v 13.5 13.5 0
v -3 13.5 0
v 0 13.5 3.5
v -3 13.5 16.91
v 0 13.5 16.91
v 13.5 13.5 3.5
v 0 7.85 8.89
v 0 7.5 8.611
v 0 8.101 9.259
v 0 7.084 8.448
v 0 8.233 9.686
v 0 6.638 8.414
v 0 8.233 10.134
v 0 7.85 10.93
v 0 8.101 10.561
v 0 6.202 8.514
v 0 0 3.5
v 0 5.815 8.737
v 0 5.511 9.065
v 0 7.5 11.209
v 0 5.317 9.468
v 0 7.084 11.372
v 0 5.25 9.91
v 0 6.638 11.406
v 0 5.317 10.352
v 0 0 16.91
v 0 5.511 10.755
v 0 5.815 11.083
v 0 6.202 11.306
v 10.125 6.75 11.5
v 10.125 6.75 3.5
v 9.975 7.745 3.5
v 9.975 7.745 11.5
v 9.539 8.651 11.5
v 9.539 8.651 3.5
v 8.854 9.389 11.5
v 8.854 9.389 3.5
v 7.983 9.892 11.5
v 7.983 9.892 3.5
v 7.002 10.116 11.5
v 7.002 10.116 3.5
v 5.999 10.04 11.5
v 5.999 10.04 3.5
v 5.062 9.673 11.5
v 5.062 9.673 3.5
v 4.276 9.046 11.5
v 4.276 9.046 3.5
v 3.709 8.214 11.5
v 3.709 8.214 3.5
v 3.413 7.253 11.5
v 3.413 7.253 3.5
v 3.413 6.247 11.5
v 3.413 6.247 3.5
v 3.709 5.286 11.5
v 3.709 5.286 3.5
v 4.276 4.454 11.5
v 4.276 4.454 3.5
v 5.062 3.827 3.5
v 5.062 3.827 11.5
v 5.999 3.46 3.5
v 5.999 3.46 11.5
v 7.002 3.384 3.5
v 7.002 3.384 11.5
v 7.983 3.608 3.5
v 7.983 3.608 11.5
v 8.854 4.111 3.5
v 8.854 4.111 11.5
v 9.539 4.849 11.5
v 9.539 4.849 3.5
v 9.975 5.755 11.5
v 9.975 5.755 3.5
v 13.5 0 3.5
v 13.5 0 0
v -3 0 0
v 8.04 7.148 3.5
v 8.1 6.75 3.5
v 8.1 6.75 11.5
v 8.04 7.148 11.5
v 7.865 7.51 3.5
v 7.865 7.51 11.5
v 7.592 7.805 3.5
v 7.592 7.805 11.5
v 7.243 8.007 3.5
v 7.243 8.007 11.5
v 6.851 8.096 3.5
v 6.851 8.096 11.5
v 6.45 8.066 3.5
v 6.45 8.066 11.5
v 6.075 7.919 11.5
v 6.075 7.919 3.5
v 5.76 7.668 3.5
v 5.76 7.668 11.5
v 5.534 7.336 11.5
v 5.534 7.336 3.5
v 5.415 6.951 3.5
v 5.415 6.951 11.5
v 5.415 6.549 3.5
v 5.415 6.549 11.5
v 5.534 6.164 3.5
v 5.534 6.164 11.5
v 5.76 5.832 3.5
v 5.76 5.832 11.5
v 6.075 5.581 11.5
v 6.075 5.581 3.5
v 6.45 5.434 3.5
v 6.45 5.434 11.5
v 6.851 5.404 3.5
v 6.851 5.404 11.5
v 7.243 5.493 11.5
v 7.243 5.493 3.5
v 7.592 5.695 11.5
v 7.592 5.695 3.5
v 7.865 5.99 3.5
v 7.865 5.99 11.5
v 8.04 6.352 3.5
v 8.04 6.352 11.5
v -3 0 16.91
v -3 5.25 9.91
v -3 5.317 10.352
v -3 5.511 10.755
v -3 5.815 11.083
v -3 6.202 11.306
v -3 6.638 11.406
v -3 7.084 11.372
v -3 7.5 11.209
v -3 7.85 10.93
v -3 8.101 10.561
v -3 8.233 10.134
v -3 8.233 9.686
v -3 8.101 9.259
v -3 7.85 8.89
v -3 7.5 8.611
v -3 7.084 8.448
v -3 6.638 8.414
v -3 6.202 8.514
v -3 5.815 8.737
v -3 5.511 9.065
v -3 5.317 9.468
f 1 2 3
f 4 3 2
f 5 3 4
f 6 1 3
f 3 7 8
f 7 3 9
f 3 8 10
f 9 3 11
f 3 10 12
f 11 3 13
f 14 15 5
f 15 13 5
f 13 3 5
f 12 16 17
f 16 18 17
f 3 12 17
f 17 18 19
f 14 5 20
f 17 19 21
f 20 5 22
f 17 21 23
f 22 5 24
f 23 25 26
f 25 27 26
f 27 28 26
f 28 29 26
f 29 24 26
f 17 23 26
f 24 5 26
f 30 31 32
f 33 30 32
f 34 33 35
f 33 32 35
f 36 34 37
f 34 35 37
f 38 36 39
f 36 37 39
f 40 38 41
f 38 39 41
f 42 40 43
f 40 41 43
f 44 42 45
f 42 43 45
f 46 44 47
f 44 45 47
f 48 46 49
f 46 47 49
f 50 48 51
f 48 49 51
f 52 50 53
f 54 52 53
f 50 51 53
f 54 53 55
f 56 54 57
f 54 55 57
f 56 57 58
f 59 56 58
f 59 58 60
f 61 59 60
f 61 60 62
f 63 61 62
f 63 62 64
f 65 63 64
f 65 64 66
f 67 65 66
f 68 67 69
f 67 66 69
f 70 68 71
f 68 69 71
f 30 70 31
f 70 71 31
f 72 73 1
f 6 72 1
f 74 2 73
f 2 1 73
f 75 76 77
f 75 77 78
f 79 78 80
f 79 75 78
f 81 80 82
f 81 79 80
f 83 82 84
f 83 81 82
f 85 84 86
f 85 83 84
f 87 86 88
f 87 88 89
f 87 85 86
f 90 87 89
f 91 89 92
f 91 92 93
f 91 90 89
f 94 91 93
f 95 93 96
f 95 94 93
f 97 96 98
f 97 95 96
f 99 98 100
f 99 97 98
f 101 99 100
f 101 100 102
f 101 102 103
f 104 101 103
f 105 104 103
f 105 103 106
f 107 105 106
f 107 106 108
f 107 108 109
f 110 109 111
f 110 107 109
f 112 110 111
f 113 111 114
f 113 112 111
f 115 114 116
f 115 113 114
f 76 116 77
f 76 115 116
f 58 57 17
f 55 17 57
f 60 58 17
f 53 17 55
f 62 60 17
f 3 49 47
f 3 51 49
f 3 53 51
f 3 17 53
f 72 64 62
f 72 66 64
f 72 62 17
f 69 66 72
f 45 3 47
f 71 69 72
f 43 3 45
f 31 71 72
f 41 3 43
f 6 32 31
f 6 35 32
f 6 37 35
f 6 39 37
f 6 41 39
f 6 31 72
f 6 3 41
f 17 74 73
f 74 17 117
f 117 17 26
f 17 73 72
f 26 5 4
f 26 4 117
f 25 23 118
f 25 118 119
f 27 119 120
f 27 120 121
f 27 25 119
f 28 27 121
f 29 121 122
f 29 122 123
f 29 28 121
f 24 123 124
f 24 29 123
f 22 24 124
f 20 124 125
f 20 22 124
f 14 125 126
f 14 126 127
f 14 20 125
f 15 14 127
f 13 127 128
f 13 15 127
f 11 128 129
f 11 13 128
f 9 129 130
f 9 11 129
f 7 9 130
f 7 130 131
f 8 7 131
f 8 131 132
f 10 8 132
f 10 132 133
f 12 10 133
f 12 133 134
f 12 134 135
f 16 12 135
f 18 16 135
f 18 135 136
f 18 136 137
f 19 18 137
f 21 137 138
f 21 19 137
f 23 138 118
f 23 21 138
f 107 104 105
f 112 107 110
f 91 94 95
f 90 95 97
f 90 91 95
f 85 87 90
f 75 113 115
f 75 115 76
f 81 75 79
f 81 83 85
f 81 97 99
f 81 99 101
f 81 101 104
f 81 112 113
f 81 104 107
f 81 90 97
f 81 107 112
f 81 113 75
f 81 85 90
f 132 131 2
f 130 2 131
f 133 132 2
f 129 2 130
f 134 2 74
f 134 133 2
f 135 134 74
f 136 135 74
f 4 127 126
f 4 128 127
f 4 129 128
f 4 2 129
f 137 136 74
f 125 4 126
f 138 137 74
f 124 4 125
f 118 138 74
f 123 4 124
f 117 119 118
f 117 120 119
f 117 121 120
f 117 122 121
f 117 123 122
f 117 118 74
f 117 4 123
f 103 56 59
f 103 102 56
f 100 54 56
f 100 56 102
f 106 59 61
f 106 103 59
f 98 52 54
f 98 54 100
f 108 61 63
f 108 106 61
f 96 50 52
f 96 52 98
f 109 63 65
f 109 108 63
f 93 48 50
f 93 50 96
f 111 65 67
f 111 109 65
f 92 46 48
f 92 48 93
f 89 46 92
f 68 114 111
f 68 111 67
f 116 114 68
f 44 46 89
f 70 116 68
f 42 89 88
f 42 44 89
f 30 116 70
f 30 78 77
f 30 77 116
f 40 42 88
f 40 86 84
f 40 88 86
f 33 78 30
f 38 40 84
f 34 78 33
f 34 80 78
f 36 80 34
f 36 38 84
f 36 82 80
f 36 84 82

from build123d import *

# Parameters (mm, degrees)
SKETCH007_W   = 13.5
SKETCH007_H   = 13.5
PAD005_DEPTH  = 3.5
SKETCH008_R   = 3.375
SKETCH008_R_2 = 1.35
PAD006_DEPTH  = 8
SKETCH009_W   = 13.5
SKETCH009_H   = 16.91
SKETCH009_R   = 1.5
PAD007_DEPTH  = 3


with BuildPart() as part:
    # Sketch007 → Pad005 (new body)
    with BuildSketch(Plane.XY):
        with Locations((6.75, 6.75)):
            Rectangle(SKETCH007_W, SKETCH007_H)
    extrude(amount=PAD005_DEPTH)

    # Sketch008 (on Face6 of Pad005) → Pad006 (join)
    with BuildSketch(Plane.XY.offset(3.5)):
        with Locations((6.75, 6.75)):
            Circle(SKETCH008_R)
        with Locations((6.75, 6.75)):
            Circle(SKETCH008_R_2, mode=Mode.SUBTRACT)
    extrude(amount=PAD006_DEPTH)

    # Sketch009 (on Face2 of Pad006) → Pad007 (join)
    with BuildSketch(Plane(origin=(0, 0, 0), x_dir=(0, -1, 0), z_dir=(-1, 0, 0))):
        with Locations((-6.75, 8.455)):
            Rectangle(SKETCH009_W, SKETCH009_H)
        with Locations((-6.75, 9.91)):
            Circle(SKETCH009_R, mode=Mode.SUBTRACT)
    extrude(amount=PAD007_DEPTH)


solid = part.part
